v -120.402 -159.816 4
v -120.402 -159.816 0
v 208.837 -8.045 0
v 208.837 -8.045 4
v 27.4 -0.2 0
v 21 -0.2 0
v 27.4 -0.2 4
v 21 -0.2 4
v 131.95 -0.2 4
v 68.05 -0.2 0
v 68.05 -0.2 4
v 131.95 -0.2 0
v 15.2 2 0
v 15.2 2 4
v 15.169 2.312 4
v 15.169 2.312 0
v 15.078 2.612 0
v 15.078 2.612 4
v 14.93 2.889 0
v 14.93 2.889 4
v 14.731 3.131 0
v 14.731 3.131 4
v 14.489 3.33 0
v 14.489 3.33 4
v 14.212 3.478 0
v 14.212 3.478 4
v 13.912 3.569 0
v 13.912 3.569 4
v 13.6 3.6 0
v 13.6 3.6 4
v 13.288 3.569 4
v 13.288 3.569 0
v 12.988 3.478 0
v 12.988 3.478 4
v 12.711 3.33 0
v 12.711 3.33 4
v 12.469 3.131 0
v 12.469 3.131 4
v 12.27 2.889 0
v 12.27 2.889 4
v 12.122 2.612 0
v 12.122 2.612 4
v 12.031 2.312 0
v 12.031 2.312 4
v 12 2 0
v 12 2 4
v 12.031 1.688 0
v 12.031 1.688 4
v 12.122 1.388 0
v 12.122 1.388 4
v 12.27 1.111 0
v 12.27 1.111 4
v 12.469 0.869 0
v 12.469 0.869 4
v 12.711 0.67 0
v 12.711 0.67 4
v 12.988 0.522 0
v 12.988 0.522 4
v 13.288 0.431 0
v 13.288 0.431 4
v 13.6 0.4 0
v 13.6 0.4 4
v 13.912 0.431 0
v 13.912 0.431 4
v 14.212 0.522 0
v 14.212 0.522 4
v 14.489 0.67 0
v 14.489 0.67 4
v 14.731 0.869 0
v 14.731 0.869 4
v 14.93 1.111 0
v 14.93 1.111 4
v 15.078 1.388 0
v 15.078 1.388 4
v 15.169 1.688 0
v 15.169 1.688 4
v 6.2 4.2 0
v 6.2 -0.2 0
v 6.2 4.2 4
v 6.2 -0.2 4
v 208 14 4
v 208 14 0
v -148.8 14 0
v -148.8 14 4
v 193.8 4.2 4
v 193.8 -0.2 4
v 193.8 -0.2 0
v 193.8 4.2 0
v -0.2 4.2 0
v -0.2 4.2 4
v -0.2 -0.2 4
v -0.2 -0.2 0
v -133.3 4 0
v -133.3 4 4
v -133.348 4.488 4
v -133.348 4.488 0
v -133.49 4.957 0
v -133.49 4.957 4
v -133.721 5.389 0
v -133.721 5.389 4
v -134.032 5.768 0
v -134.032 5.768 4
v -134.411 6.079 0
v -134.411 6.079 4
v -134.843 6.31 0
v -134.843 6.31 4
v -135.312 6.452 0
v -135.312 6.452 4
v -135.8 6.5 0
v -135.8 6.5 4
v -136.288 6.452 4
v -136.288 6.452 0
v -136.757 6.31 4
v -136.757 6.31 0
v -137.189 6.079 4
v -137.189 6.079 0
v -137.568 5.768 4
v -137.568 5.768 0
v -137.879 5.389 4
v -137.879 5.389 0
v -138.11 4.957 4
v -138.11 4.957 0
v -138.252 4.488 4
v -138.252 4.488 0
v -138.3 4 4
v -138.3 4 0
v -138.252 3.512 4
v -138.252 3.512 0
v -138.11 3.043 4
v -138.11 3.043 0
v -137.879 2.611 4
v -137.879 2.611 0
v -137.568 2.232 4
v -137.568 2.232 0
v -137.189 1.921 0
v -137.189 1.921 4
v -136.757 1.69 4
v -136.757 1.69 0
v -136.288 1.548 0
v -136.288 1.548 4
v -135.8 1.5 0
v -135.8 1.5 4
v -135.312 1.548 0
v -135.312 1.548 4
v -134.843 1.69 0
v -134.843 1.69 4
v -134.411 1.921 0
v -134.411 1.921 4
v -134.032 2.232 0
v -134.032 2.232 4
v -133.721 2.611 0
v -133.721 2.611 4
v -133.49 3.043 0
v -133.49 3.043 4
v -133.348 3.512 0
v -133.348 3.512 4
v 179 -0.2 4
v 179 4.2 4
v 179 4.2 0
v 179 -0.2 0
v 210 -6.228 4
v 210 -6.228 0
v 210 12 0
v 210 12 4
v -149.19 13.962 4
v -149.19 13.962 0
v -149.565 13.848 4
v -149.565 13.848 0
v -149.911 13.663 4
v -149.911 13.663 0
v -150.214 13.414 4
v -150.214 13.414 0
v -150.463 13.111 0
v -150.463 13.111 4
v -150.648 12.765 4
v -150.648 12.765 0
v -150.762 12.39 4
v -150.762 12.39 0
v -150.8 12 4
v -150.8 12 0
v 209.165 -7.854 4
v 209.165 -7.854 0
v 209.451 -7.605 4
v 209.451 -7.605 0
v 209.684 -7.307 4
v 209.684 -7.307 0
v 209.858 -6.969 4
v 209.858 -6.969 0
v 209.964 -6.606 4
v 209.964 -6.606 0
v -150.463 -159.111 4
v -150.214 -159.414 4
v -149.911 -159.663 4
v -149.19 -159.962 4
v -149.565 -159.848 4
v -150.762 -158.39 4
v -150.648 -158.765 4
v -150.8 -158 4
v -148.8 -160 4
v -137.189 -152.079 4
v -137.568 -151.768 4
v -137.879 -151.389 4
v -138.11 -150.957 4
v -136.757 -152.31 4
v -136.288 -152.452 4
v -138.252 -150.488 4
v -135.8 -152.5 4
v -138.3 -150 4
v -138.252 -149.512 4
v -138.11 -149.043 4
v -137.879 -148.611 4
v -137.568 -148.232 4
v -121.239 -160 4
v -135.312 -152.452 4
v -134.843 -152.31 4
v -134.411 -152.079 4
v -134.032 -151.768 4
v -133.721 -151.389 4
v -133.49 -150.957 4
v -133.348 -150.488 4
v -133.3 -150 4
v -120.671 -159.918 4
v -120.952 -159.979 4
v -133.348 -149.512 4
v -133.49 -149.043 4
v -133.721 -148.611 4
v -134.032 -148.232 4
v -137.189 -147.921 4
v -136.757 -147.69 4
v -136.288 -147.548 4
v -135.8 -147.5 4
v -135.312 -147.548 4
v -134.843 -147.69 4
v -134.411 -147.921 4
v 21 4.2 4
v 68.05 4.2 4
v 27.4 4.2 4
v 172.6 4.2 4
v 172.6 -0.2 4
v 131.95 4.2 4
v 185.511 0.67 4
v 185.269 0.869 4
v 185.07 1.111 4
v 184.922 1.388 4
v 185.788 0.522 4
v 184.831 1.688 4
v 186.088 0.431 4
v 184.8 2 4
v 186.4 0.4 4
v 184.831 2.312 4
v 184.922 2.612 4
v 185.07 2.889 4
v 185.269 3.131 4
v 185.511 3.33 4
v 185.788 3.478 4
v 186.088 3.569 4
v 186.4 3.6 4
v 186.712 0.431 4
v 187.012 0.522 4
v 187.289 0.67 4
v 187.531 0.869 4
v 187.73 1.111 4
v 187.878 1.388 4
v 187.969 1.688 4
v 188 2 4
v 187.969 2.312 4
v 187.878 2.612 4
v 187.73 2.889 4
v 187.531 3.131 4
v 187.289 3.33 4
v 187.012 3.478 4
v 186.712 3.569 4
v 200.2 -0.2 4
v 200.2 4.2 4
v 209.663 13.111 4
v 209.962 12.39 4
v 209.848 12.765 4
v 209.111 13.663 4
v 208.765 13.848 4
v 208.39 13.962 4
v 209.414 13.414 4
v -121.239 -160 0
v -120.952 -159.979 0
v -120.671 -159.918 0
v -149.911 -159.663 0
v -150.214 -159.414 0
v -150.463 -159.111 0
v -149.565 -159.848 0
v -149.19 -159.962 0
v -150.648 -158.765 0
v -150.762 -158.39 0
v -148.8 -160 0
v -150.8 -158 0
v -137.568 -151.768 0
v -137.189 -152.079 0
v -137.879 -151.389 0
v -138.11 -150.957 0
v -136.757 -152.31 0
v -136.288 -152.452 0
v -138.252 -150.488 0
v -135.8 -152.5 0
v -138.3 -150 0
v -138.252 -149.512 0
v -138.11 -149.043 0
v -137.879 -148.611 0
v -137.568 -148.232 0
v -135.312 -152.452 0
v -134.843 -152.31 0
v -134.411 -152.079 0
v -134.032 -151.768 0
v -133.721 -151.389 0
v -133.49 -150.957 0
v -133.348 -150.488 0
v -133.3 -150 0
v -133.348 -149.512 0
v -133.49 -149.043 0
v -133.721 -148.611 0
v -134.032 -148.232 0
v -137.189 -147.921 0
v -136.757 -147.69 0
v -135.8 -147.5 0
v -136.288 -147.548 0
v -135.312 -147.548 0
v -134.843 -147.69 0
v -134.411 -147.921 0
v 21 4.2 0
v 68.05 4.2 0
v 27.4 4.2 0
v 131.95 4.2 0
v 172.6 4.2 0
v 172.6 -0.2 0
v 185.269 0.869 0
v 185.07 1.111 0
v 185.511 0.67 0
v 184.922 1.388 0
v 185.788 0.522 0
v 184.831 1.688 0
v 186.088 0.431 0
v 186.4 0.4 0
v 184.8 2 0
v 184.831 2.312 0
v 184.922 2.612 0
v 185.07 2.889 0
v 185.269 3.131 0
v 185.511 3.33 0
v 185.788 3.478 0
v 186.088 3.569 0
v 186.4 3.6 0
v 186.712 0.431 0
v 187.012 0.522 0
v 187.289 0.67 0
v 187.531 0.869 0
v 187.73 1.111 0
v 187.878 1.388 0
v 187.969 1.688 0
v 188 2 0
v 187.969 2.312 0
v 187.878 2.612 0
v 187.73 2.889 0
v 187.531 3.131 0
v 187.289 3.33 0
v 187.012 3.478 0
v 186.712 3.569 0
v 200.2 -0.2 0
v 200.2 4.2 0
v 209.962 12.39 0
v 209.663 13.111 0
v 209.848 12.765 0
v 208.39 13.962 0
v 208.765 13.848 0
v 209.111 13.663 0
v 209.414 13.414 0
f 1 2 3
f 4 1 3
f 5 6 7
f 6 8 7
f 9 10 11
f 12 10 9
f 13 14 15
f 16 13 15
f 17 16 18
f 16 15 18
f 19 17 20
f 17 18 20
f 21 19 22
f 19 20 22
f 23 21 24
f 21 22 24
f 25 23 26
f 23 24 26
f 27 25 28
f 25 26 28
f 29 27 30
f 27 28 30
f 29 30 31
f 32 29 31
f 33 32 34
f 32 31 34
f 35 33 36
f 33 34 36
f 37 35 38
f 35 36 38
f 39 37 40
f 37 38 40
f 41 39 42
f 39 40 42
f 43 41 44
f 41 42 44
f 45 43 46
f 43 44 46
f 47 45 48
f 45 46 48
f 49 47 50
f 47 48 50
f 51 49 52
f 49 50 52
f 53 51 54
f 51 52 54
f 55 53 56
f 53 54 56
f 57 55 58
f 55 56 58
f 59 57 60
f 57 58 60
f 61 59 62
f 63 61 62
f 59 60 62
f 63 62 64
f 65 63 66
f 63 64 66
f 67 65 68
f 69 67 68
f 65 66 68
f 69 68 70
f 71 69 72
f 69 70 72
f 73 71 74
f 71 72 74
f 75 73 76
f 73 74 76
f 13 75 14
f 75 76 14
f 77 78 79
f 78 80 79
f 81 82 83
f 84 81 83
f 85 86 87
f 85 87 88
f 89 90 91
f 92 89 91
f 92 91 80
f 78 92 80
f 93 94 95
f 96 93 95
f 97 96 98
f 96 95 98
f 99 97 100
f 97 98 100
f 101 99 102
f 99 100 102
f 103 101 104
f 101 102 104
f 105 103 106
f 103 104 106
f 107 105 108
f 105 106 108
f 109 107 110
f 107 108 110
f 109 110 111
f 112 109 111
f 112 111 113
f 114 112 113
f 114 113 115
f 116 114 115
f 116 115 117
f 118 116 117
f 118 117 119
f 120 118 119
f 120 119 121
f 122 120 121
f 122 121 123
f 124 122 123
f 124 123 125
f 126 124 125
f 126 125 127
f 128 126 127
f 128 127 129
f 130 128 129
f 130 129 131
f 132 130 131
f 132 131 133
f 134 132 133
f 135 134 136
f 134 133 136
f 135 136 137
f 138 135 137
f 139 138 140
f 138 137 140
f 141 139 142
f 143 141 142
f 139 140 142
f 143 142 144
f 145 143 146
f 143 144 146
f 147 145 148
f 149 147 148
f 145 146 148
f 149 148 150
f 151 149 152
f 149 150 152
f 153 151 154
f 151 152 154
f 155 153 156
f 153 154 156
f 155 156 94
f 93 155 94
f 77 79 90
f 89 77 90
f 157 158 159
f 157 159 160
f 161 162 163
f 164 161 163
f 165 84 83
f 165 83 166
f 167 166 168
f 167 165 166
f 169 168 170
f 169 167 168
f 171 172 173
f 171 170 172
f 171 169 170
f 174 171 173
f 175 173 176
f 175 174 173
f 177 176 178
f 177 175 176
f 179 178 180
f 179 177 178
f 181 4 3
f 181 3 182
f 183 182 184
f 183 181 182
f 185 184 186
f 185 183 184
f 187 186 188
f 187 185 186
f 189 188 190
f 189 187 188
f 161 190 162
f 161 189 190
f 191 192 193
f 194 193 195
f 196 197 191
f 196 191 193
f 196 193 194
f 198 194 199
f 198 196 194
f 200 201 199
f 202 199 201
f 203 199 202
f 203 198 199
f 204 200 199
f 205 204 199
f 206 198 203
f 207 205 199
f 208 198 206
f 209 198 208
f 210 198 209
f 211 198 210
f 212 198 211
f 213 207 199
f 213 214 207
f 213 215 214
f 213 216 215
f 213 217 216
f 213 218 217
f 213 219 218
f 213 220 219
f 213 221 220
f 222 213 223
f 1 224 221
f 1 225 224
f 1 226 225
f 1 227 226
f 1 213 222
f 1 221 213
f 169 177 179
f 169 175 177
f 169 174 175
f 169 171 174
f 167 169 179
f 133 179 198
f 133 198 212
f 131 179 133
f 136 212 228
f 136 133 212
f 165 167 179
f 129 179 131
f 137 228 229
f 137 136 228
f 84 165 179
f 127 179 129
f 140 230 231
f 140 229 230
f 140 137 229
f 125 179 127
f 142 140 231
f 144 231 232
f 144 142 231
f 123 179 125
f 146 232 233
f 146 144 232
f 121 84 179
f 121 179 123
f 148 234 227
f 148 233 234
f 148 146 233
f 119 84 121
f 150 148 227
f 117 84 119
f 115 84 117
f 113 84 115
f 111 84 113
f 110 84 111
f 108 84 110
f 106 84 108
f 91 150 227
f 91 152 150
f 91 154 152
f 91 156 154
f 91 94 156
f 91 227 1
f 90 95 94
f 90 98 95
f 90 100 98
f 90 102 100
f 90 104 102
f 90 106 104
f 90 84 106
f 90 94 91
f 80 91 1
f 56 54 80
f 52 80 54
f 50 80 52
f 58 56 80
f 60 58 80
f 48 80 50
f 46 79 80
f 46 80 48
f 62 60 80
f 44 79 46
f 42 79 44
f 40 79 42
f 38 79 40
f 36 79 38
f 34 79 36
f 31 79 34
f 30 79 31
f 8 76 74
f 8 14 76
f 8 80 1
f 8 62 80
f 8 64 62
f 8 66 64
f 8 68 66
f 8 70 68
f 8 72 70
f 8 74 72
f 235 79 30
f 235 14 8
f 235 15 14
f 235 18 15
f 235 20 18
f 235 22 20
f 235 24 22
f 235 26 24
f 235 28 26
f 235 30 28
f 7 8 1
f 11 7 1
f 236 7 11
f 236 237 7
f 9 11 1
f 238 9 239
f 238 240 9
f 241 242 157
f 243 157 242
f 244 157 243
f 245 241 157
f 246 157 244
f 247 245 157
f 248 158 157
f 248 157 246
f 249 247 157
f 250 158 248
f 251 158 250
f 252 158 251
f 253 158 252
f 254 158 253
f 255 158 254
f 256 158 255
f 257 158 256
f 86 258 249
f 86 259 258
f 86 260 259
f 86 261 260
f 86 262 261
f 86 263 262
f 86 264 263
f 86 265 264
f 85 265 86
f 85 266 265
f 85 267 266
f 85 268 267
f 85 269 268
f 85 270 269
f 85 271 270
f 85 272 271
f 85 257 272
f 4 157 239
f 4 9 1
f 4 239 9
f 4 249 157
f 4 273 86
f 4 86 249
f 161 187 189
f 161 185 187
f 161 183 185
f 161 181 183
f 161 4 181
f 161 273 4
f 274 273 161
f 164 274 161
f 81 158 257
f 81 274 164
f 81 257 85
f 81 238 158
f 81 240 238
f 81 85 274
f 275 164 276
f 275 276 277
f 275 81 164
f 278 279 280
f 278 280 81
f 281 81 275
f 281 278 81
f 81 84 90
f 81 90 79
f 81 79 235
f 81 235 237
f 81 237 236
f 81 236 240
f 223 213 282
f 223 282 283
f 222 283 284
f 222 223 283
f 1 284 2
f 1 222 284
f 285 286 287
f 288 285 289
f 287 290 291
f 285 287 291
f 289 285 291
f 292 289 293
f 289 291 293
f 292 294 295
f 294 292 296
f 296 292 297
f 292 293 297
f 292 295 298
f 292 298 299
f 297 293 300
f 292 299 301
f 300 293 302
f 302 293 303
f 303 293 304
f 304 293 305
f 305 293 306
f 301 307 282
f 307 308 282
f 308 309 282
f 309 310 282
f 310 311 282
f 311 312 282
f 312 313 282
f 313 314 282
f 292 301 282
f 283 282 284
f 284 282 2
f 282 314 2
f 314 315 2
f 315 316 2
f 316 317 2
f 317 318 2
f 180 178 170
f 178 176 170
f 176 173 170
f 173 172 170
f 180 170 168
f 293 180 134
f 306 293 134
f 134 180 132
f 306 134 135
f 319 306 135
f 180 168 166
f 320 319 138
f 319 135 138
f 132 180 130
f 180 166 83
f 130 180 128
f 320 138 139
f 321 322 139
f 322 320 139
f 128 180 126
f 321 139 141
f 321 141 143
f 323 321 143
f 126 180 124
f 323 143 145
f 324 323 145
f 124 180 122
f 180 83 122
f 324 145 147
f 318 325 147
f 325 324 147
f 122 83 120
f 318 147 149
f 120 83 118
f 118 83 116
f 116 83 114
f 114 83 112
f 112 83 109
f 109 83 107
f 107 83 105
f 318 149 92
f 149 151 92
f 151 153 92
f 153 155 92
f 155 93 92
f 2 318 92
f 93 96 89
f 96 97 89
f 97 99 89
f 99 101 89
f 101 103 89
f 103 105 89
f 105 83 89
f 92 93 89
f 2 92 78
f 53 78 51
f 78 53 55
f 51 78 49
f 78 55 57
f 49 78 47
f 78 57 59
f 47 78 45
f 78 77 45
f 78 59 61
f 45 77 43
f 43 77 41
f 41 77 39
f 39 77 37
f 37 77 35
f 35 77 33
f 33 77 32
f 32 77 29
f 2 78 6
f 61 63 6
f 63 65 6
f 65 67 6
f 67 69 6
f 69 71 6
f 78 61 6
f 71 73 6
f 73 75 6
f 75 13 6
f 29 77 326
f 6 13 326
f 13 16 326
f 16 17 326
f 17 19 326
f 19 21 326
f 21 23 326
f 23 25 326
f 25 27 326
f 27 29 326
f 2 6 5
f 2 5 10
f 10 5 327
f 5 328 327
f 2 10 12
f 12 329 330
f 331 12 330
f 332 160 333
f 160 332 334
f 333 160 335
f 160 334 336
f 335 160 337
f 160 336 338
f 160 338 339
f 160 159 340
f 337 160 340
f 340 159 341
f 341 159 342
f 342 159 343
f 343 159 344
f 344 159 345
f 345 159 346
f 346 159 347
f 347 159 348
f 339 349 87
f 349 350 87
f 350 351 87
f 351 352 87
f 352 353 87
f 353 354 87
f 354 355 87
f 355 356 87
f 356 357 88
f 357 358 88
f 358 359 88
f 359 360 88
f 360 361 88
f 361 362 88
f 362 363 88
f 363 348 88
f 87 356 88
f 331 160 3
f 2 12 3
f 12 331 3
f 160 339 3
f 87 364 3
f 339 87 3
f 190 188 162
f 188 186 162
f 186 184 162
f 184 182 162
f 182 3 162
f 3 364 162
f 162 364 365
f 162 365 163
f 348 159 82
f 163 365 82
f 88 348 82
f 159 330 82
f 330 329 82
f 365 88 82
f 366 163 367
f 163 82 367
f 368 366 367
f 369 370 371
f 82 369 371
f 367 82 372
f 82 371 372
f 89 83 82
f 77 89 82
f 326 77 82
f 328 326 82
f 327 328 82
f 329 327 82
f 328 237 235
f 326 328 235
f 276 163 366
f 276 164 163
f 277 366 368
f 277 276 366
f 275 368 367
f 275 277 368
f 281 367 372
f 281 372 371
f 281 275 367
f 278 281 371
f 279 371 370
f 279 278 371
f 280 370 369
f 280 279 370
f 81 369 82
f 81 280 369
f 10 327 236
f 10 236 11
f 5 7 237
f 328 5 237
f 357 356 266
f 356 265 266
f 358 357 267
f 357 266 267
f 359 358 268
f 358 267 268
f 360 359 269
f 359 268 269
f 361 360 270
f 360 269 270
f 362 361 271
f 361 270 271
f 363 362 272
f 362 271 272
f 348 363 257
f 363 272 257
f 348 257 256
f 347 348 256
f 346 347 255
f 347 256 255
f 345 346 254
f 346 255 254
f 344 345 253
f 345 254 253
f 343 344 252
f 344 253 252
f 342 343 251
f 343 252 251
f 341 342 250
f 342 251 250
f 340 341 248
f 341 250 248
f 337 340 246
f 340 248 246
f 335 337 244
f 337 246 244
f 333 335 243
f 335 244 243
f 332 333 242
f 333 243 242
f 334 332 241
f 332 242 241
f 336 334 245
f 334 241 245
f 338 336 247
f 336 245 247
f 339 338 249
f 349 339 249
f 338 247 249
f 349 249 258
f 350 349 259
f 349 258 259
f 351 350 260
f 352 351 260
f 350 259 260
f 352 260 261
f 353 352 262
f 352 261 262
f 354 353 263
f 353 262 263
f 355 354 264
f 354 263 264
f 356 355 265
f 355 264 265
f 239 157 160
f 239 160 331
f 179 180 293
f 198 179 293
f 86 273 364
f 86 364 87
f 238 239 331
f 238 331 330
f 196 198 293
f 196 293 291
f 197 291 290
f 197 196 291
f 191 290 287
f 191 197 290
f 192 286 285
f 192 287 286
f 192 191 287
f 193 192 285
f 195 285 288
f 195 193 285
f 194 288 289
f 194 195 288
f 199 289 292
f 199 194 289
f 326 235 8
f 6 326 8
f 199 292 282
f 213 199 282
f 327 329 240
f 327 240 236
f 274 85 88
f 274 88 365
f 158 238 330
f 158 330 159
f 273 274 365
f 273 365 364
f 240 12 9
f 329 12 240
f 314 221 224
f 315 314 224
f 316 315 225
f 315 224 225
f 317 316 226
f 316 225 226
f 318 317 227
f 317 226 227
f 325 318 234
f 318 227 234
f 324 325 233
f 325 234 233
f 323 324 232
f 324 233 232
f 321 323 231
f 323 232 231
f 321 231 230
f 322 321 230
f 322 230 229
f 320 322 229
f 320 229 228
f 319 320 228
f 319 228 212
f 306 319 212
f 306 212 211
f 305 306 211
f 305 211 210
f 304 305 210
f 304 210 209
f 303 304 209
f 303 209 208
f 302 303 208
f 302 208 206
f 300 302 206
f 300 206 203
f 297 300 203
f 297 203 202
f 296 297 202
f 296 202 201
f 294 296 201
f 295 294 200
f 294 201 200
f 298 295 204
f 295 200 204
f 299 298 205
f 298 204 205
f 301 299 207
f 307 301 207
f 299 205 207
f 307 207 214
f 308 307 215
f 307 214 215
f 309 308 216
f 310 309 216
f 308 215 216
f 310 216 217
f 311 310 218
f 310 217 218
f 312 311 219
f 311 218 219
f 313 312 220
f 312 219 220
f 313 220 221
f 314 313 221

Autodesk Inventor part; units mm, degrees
ref_plane "YZ Plane" through (0, 0, 0) normal (1, 0, 0) x (0, 1, 0)
ref_plane "XZ Plane" through (0, 0, 0) normal (0, 1, 0) x (-1, 0, 0)
ref_plane "XY Plane" through (0, 0, 0) normal (0, 0, 1) x (1, 0, 0)
sketch "Sketch1" plane through (0, 0, 0) normal (0, 0, 1) x (1, 0, 0)
  line L0 (11.9, 0) -> (6, 0) construction
  line L1 (6, 4) -> (11.9, 4) construction
  line L2 (-150.8, -316.8297) -> (-150.8003, 183.1703) construction
  line L3 (210, 14) -> (-150.8001, 14)
  line L4 (-150.8001, 14) -> (-150.8001, -160)
  line L5 (-150.8001, -160) -> (-120.8001, -160)
  line L6 (210, -7.5086) -> (210, 14)
  line L7 (-120.8, -316.8296) -> (-120.8003, 183.1704) construction
  line L8 (-120.8001, -160) -> (210, -7.5086)
  line L9 (425, -160) -> (0, -160) projected
  line L10 (6, 4) -> (6, 0) projected
  line L11 (11.9, 0) -> (11.9, 4) projected
  dimension "d0" = 10
extrude "Extrusion1" add sketch "Sketch1" along normal blind 4
fillet "Fillet1" radius 2 5 edges at (210, 14, 2) (210, -7.5086, 2) (-150.8001, 14, 2) (-150.8001, -160, 2) (-120.8001, -160, 2)
sketch "Sketch2" plane through (0, 0, 4) normal (0, 0, 1) x (1, 0, 0)
  point P0 (0, 0)
sketch "Sketch3" plane through (0, 0, 4) normal (0, 0, 1) x (1, 0, 0)
  line L0 (200, 0) -> (200, 4) projected
  line L1 (200, 4) -> (199.5, 4) projected
  line L2 (194.5, 4) -> (199.5, 4) projected
  line L3 (194.5, 4) -> (194, 4) projected
  line L4 (194, 0) -> (194, 4)
  line L5 (194, 0) -> (194.5, 0) projected
  line L6 (199.5, 0) -> (194.5, 0) projected
  line L7 (199.5, 0) -> (200, 0) projected
  line L8 (200.2, 4.2) -> (200.2, -0.2)
  line L9 (200.2, -0.2) -> (199.5, -0.2)
  line L10 (199.5, -0.2) -> (194.5, -0.2)
  line L11 (194.5, -0.2) -> (193.8, -0.2)
  line L12 (193.8, -0.2) -> (193.8, 4.2)
  line L13 (193.8, 4.2) -> (194.5, 4.2)
  line L14 (194.5, 4.2) -> (199.5, 4.2)
  line L15 (199.5, 4.2) -> (200.2, 4.2)
  line L16 (178.3, 0) -> (173.3, 0) projected
  line L17 (178.3, 0) -> (178.8, 0) projected
  line L18 (178.8, 0) -> (178.8, 4) projected
  arc A0 (-121.2388, -160) -> (-120.4016, -159.8163) centre (-121.2388, -158) ccw projected
  line L19 (-120.4016, -159.8163) -> (208.8373, -8.0446) projected
  arc A1 (208.8373, -8.0446) -> (210, -6.2283) centre (208, -6.2283) ccw projected
  line L20 (210, -6.2283) -> (210, 12) projected
  arc A2 (210, 12) -> (208, 14) centre (208, 12) ccw projected
  line L21 (208, 14) -> (-148.8001, 14) projected
  arc A3 (-148.8001, 14) -> (-150.8001, 12) centre (-148.8001, 12) ccw projected
  line L22 (-150.8001, 12) -> (-150.8001, -158) projected
  arc A4 (-150.8001, -158) -> (-148.8001, -160) centre (-148.8001, -158) ccw projected
  line L23 (-148.8001, -160) -> (-121.2388, -160) projected
  line L24 (178.8, 4) -> (178.3, 4) projected
  line L25 (173.3, 4) -> (178.3, 4) projected
  line L26 (173.3, 4) -> (172.8, 4) projected
  line L27 (172.8, 0) -> (172.8, 4) projected
  line L28 (172.8, 0) -> (173.3, 0) projected
  line L29 (21.7, 4) -> (26.7, 4) projected
  line L30 (27.2, 4) -> (26.7, 4) projected
  line L31 (27.2, 0) -> (27.2, 4)
  line L32 (26.7, 0) -> (27.2, 0) projected
  line L33 (26.7, 0) -> (21.7, 0) projected
  line L34 (21.2, 0) -> (21.7, 0) projected
  line L35 (21.2, 0) -> (21.2, 4)
  line L36 (21.7, 4) -> (21.2, 4) projected
  line L37 (6, 0) -> (6, 4)
  line L38 (0, 0) -> (0, 4) projected
  line L39 (5.5, 0) -> (0.5, 0) projected
  line L40 (0.5, 4) -> (5.5, 4) projected
  line L41 (6, 4) -> (5.5, 4) projected
  line L42 (5.5, 0) -> (6, 0) projected
  line L43 (0, 0) -> (0.5, 0) projected
  line L44 (0.5, 4) -> (0, 4) projected
  line L45 (11.9, 4) -> (15.3, 4) projected
  line L46 (11.9, 4) -> (11.9, 0) projected
  line L47 (15.3, 0) -> (11.9, 0) projected
  line L48 (15.3, 4) -> (15.3, 0) projected
  line L49 (184.7, 4) -> (188.1, 4) projected
  line L50 (184.7, 4) -> (184.7, 0) projected
  line L51 (188.1, 0) -> (184.7, 0) projected
  line L52 (188.1, 4) -> (188.1, 0) projected
  line L53 (179, 4.2) -> (179, -0.2)
  line L54 (179, -0.2) -> (178.3, -0.2)
  line L55 (178.3, -0.2) -> (173.3, -0.2)
  line L56 (173.3, -0.2) -> (172.6, -0.2)
  line L57 (172.6, -0.2) -> (172.6, 4.2)
  line L58 (172.6, 4.2) -> (173.3, 4.2)
  line L59 (173.3, 4.2) -> (178.3, 4.2)
  line L60 (178.3, 4.2) -> (179, 4.2)
  line L61 (21.7, -0.2) -> (26.7, -0.2)
  line L62 (26.7, -0.2) -> (27.4, -0.2)
  line L63 (27.4, -0.2) -> (27.4, 4.2)
  line L64 (27.4, 4.2) -> (26.7, 4.2)
  line L65 (26.7, 4.2) -> (21.7, 4.2)
  line L66 (21.7, 4.2) -> (21, 4.2)
  line L67 (21, 4.2) -> (21, -0.2)
  line L68 (21, -0.2) -> (21.7, -0.2)
  line L69 (-0.2, 4.2) -> (-0.2, -0.2)
  line L70 (-0.2, -0.2) -> (0.5, -0.2)
  line L71 (0.5, -0.2) -> (5.5, -0.2)
  line L72 (5.5, -0.2) -> (6.2, -0.2)
  line L73 (6.2, -0.2) -> (6.2, 4.2)
  line L74 (6.2, 4.2) -> (5.5, 4.2)
  line L75 (5.5, 4.2) -> (0.5, 4.2)
  line L76 (0.5, 4.2) -> (-0.2, 4.2)
  circle A5 centre (13.6, 2) radius 1.6
  circle A6 centre (186.4, 2) radius 1.6
  point P0 (0, 0)
  dimension "d5" = 0.2
  dimension "d6" = 0.2
  dimension "d7" = 0.2
  dimension "d8" = 0.2
  dimension "d9" = 3.2
  dimension "d10" = 3.2
extrude "Extrusion2" cut sketch "Sketch3" against normal blind 4 contours L7 L6 L5 L4 L3 L2 L1 L0 | L8 L9 L10 L11 L12 L13 L14 L15 | L16 L28 L27 L26 L25 L24 L18 L17 | L29 L30 L31 L32 L33 L34 L35 L36 | L42 L39 L43 L38 L44 L40 L41 L37 | L53 L54 L55 L56 L57 L58 L59 L60 | L68 L67 L66 L65 L64 L63 L62 L61 | L76 L75 L74 L73 L72 L71 L70 L69 | A5 | A6
sketch "Sketch4" plane through (0, 0, 4) normal (0, 0, 1) x (1, 0, 0)
  line L0 (-139.9, -316.8296) -> (-139.9003, 183.1704) construction
  line L1 (-131.7, -316.8296) -> (-139.9, -316.8296) construction
  line L2 (-131.7, -316.8296) -> (-131.7003, 183.1704) construction
  line L3 (-139.9003, 183.1704) -> (-131.7003, 183.1704) construction
  line L4 (-131.7002, 4) -> (-139.9001, 4) construction
  line L5 (-139.9001, 4) -> (-139.9001, -150) construction
  line L6 (-139.9001, -150) -> (-131.7002, -150) construction
  line L7 (-131.7002, -150) -> (-131.7002, 4) construction
  line L8 (208, 14) -> (-148.8001, 14) projected
  line L9 (-148.8001, -160) -> (-121.2388, -160) projected
  circle A0 centre (-135.8001, 4) radius 2.5
  circle A1 centre (-135.8001, -150) radius 2.5
  point P0 (0, 0)
  dimension "d13" = 10
  dimension "d14" = 10
  dimension "d15" = 5
  dimension "d16" = 5
extrude "Extrusion3" cut sketch "Sketch4" against normal blind 4
sketch "Sketch5" plane through (0, 0, 0) normal (0, 0, -1) x (-1, 0, 0)
  line L0 (-131.75, 4) -> (-131.75, 0) projected
  line L1 (-68.25, 0) -> (-68.25, 4) projected
  line L2 (-131.75, 0) -> (-68.25, 0)
  line L3 (-68.25, 0) -> (-68.25, 4)
  line L4 (-68.25, 4) -> (-131.75, 4)
  line L5 (-131.75, 4) -> (-131.75, 0)
  line L6 (-131.95, 4.2) -> (-68.05, 4.2)
  line L7 (-68.05, 4.2) -> (-68.05, -0.2)
  line L8 (-68.05, -0.2) -> (-131.95, -0.2)
  line L9 (-131.95, -0.2) -> (-131.95, 4.2)
  point P0 (0, 0)
  dimension "d19" = 0.2
extrude "Extrusion4" cut sketch "Sketch5" against normal blind 25.4 contours L4 L1 L2 L0 | L6 L7 L8 L9
properties part number "Projector mount side"
